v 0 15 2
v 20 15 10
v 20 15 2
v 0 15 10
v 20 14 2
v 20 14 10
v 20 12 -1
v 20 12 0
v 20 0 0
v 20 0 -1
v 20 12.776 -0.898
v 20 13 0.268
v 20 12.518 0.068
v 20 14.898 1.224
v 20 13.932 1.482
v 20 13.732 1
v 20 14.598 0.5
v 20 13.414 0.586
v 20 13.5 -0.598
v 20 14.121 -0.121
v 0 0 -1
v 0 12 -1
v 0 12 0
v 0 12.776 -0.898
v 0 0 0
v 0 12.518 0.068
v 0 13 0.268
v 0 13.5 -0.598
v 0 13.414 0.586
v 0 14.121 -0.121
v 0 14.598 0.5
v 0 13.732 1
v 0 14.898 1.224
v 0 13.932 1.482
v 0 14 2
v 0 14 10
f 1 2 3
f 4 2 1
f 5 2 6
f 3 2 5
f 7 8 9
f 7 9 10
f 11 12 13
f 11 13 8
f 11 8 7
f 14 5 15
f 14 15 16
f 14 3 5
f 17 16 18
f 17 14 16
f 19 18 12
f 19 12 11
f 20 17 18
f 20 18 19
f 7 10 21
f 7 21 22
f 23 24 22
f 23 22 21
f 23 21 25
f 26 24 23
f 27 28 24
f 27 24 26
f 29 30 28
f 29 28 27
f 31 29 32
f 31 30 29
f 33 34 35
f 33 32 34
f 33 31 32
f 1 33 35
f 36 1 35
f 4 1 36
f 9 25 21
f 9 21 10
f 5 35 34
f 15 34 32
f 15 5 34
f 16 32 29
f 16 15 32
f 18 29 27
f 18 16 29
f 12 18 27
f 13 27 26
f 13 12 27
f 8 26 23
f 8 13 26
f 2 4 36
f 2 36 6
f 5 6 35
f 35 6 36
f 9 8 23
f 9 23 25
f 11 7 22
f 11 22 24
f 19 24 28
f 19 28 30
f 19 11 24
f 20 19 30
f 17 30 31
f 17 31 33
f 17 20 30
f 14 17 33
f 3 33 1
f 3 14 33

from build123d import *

# Parameters (mm, degrees)
SKETCH_1_W            = 20
SKETCH_1_H            = 10
BASEPLATE_DEPTH       = 1
EDGEFLANGE_DEPTH      = 20
EDGEFLANGE_FLAT_DEPTH = 1


# Sheet-metal steps are written as plain solids
with BuildPart() as part:
    # BasePlate: sheet metal written as solids
    # Sketch 1 → BasePlate (new body)
    with BuildSketch(Plane.XY):
        with Locations((10, 5)):
            Rectangle(SKETCH_1_W, SKETCH_1_H)
    extrude(amount=-BASEPLATE_DEPTH)

    # EdgeFlange: sheet metal written as solids
    # EdgeFlange bend section (on a plane across the edge) → EdgeFlange (add)
    with BuildSketch(Plane(origin=(20, 15, 0), x_dir=(0, -1, 0), z_dir=(-1, 0, 0))):
        with BuildLine():
            Line((0, 2), (1, 2))
            ThreePointArc((1, 2), (1.585786438, 0.585786438), (3, 0))
            Line((3, 0), (5, 0))
            Line((5, 0), (5, -1))
            Line((5, -1), (3, -1))
            ThreePointArc((3, -1), (0.878679656, -0.121320344), (0, 2))
        make_face()
    extrude(amount=EDGEFLANGE_DEPTH)

    # EdgeFlange profile (on flange) → EdgeFlange flat (add)
    with BuildSketch(Plane(origin=(0, 15, 0), x_dir=(-1, 0, 0), z_dir=(0, 1, 0))):
        Polygon((-20, 10), (-20, 2), (0, 2), (0, 10), (-2, 10), (-18, 10), align=None)
    extrude(amount=-EDGEFLANGE_FLAT_DEPTH)


solid = part.part
